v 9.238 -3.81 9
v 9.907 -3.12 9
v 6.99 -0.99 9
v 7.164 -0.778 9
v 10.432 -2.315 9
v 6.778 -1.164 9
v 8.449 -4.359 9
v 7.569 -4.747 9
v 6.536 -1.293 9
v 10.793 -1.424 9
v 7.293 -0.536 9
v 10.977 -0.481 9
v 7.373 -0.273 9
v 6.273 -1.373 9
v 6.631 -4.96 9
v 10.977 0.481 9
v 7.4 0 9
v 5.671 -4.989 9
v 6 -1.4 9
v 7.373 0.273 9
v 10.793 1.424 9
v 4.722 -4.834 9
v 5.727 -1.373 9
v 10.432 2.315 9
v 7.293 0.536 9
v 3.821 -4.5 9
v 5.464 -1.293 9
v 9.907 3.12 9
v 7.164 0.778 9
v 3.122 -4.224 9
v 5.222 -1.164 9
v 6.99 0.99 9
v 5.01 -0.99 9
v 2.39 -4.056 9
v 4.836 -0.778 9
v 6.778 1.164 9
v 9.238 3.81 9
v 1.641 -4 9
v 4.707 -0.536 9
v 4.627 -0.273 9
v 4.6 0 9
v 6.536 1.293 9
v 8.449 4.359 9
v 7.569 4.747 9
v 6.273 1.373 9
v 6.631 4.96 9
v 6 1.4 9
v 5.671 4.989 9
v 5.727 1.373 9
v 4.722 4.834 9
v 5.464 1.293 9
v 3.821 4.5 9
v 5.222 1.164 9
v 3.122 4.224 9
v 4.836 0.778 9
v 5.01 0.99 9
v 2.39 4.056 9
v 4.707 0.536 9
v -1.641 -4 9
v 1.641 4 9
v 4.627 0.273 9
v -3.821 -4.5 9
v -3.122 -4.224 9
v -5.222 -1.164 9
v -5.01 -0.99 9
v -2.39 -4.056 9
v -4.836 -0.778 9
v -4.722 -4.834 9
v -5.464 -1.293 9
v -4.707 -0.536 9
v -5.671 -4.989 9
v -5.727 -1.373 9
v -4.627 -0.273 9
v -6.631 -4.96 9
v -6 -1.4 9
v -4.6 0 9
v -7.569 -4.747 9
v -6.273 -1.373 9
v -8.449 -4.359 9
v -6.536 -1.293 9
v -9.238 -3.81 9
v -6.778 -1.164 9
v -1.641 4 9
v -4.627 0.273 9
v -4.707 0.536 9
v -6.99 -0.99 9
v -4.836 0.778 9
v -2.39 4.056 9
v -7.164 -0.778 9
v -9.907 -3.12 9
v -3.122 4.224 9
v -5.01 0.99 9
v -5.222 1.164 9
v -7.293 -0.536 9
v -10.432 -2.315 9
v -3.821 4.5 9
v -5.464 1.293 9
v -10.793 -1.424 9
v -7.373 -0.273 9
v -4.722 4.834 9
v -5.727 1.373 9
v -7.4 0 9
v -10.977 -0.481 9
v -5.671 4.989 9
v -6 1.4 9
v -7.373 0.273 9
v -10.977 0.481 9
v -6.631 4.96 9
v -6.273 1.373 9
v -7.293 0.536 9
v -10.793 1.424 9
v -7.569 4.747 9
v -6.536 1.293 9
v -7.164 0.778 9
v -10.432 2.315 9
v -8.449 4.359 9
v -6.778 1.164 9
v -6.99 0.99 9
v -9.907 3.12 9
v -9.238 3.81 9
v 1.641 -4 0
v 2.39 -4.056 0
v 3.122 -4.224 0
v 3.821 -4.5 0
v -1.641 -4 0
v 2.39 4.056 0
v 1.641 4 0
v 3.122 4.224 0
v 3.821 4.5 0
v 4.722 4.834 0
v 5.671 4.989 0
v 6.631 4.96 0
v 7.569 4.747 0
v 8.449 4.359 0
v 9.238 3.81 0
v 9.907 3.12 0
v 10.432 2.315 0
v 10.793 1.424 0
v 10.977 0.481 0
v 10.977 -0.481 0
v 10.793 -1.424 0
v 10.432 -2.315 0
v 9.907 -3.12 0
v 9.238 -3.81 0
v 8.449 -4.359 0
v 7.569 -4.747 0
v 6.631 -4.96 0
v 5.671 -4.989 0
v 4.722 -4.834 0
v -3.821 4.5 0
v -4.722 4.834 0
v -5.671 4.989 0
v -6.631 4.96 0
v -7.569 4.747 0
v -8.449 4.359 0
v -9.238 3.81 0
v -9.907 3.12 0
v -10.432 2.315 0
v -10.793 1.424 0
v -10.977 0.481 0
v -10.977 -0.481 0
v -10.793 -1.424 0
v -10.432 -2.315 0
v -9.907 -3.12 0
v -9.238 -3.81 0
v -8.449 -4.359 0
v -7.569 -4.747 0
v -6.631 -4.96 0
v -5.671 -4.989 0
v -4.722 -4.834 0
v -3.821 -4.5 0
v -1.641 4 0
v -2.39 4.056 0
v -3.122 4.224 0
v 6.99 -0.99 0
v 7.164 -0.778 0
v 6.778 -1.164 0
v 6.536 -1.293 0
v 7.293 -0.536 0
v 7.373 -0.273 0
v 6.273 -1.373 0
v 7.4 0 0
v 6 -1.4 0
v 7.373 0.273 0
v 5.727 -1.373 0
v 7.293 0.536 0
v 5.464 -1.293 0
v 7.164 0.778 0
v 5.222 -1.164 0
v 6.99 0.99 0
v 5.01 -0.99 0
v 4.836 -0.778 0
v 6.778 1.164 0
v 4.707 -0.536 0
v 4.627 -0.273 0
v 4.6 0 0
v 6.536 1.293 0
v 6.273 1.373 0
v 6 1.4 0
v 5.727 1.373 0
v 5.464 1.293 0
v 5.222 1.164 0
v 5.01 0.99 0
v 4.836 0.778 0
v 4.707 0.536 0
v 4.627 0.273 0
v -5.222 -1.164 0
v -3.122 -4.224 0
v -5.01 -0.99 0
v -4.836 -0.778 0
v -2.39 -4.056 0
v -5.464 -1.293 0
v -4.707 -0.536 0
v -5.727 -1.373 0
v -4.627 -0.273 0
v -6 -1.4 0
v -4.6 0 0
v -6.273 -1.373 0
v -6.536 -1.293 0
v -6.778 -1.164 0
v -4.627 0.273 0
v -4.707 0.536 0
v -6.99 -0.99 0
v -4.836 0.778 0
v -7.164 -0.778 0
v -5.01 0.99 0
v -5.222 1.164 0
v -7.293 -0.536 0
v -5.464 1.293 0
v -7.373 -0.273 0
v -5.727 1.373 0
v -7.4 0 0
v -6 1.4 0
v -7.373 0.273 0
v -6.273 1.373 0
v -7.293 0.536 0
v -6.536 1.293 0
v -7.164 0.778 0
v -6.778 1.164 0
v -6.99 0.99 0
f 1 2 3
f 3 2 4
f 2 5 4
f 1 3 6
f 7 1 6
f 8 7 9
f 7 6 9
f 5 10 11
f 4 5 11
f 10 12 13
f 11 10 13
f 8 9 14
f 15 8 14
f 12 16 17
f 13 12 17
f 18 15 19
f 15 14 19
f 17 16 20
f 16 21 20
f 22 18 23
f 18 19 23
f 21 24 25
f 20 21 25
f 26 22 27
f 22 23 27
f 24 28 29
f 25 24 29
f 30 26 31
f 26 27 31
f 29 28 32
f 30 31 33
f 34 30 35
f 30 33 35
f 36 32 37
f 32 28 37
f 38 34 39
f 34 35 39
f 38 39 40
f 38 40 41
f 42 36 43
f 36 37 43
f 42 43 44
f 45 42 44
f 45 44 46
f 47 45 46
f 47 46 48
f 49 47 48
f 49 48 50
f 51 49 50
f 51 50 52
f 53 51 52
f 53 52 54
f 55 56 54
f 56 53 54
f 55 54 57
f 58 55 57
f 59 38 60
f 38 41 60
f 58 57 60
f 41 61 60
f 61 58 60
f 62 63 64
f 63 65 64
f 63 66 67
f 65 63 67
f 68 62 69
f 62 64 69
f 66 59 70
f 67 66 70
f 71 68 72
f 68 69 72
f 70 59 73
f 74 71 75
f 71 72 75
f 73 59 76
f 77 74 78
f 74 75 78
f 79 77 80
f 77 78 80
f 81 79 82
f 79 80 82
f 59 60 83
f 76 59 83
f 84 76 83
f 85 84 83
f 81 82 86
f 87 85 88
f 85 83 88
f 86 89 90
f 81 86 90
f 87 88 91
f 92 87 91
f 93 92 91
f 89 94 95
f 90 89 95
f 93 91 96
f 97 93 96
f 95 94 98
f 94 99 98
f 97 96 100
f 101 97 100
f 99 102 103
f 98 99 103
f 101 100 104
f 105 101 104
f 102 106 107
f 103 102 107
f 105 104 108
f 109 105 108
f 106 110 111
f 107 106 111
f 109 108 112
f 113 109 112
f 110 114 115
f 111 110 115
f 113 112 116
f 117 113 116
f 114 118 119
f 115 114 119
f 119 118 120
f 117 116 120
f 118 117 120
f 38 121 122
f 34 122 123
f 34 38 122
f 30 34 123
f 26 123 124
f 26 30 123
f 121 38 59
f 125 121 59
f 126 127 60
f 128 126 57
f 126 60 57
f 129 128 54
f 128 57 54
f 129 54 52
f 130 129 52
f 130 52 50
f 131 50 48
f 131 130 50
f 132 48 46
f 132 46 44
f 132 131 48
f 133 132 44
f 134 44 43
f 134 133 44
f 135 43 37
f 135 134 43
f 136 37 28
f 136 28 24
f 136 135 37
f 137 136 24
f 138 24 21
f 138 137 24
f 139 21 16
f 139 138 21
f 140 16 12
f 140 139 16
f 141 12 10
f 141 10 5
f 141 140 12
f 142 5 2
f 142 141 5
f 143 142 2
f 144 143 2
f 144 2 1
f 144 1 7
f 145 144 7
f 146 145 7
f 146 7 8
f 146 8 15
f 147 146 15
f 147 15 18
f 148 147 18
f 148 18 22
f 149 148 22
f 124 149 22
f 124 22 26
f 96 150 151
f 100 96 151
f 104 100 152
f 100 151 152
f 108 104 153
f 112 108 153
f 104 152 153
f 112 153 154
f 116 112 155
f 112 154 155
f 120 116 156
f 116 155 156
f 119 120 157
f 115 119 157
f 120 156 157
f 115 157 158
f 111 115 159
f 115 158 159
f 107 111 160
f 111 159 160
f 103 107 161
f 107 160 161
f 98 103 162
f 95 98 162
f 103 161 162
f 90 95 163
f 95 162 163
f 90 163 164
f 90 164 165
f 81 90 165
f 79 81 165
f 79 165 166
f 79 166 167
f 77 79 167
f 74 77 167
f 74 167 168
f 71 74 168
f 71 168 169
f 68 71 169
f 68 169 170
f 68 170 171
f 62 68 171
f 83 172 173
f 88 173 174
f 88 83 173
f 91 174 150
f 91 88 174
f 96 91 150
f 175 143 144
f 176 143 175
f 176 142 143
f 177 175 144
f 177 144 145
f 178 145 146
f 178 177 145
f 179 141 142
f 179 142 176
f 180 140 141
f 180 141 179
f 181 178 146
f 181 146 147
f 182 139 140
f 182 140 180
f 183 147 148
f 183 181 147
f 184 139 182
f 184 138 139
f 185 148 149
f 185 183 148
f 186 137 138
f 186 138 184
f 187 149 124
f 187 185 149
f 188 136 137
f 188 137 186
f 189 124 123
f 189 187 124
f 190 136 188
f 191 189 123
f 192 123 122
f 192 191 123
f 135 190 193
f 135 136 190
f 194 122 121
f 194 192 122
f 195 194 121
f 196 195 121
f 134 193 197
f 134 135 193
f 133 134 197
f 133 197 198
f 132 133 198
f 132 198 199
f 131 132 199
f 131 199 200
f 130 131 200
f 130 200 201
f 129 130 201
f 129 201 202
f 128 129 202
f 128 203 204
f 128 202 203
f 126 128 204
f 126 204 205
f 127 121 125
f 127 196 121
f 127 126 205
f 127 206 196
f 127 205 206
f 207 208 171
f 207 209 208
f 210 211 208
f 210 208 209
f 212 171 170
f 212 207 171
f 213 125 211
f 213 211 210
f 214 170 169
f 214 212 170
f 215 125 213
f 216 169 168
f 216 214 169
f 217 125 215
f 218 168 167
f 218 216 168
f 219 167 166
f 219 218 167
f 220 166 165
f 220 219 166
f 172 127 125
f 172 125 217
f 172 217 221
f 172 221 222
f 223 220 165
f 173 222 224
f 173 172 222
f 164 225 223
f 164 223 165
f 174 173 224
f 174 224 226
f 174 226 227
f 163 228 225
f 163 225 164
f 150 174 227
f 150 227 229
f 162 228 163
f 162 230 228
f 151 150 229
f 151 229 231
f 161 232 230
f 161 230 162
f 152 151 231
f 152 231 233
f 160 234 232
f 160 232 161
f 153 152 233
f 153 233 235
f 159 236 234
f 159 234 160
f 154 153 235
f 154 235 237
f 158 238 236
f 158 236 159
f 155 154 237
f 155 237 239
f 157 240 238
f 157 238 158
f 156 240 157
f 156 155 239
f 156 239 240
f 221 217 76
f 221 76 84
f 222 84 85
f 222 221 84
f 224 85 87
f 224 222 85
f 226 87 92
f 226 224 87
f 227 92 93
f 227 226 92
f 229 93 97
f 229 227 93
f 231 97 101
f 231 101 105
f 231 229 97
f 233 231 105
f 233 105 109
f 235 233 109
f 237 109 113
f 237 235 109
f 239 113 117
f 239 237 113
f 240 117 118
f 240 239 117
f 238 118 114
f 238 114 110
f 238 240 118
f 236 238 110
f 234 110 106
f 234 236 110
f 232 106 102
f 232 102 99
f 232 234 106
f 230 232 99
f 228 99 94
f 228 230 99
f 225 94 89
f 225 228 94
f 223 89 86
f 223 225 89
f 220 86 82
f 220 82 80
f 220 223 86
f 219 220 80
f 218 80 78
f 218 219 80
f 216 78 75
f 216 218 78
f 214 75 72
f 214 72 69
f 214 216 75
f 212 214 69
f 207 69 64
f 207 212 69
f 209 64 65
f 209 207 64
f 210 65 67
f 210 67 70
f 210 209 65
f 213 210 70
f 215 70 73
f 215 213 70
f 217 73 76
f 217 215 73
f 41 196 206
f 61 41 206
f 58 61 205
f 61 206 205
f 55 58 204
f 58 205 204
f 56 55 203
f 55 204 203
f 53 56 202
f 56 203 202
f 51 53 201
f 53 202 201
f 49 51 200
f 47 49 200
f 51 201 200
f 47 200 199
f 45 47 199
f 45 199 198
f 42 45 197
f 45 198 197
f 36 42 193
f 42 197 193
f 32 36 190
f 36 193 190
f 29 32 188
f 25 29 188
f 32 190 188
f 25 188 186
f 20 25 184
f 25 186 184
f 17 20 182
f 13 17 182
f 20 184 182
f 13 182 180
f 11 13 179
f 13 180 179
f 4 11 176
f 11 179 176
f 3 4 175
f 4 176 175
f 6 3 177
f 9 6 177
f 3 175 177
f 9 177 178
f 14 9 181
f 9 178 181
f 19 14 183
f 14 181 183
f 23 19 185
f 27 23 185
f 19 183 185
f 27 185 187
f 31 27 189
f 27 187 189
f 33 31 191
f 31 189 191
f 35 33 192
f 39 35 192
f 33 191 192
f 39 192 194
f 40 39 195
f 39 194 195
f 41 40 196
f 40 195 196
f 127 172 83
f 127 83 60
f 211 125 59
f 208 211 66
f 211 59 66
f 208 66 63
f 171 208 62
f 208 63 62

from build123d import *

# Parameters (mm, degrees)
F0_R     = 1.4
F1_DEPTH = 9
F2_R     = 5


with BuildPart() as f1:
    # F0 (on Top) → F1 (new body)
    with BuildSketch(Plane.XY):
        with BuildLine():
            Line((0, -4), (0, 0))
            Line((0, 0), (-1, 0))
            ThreePointArc((-1, 0), (-1.527864, -2.236068), (-3, -4))
            Line((-3, -4), (0, -4))
        make_face()
        with BuildLine():
            Line((-1, 0), (0, 0))
            Line((0, 0), (0, 4))
            Line((0, 4), (-3, 4))
            ThreePointArc((-3, 4), (-1.527864, 2.236068), (-1, 0))
        make_face()
        with Locations((-6, 0)):
            Circle(F0_R)
        with BuildLine():
            ThreePointArc((-3, -4), (-1.527864, -2.236068), (-1, 0))
            ThreePointArc((-1, 0), (-1.527864, 2.236068), (-3, 4))
            ThreePointArc((-3, 4), (-11, 0), (-3, -4))
        make_face()
        with Locations((-6, 0)):
            Circle(F0_R, mode=Mode.SUBTRACT)
    extrude(amount=F1_DEPTH)

    # F2
    f2_edges = [f1.edges().sort_by_distance(p)[0] for p in [
        (-3, 4, 4.5),
        (-3, -4, 4.5),
    ]]
    fillet(f2_edges, radius=F2_R)

    # F3: F1 across face


with BuildPart() as f1_1:
    add(f1.part)
    add(f1.part.mirror(Plane(origin=(0, 0, 4.5), x_dir=(0, 1, 0), z_dir=(1, 0, 0))))


solid = f1_1.part
